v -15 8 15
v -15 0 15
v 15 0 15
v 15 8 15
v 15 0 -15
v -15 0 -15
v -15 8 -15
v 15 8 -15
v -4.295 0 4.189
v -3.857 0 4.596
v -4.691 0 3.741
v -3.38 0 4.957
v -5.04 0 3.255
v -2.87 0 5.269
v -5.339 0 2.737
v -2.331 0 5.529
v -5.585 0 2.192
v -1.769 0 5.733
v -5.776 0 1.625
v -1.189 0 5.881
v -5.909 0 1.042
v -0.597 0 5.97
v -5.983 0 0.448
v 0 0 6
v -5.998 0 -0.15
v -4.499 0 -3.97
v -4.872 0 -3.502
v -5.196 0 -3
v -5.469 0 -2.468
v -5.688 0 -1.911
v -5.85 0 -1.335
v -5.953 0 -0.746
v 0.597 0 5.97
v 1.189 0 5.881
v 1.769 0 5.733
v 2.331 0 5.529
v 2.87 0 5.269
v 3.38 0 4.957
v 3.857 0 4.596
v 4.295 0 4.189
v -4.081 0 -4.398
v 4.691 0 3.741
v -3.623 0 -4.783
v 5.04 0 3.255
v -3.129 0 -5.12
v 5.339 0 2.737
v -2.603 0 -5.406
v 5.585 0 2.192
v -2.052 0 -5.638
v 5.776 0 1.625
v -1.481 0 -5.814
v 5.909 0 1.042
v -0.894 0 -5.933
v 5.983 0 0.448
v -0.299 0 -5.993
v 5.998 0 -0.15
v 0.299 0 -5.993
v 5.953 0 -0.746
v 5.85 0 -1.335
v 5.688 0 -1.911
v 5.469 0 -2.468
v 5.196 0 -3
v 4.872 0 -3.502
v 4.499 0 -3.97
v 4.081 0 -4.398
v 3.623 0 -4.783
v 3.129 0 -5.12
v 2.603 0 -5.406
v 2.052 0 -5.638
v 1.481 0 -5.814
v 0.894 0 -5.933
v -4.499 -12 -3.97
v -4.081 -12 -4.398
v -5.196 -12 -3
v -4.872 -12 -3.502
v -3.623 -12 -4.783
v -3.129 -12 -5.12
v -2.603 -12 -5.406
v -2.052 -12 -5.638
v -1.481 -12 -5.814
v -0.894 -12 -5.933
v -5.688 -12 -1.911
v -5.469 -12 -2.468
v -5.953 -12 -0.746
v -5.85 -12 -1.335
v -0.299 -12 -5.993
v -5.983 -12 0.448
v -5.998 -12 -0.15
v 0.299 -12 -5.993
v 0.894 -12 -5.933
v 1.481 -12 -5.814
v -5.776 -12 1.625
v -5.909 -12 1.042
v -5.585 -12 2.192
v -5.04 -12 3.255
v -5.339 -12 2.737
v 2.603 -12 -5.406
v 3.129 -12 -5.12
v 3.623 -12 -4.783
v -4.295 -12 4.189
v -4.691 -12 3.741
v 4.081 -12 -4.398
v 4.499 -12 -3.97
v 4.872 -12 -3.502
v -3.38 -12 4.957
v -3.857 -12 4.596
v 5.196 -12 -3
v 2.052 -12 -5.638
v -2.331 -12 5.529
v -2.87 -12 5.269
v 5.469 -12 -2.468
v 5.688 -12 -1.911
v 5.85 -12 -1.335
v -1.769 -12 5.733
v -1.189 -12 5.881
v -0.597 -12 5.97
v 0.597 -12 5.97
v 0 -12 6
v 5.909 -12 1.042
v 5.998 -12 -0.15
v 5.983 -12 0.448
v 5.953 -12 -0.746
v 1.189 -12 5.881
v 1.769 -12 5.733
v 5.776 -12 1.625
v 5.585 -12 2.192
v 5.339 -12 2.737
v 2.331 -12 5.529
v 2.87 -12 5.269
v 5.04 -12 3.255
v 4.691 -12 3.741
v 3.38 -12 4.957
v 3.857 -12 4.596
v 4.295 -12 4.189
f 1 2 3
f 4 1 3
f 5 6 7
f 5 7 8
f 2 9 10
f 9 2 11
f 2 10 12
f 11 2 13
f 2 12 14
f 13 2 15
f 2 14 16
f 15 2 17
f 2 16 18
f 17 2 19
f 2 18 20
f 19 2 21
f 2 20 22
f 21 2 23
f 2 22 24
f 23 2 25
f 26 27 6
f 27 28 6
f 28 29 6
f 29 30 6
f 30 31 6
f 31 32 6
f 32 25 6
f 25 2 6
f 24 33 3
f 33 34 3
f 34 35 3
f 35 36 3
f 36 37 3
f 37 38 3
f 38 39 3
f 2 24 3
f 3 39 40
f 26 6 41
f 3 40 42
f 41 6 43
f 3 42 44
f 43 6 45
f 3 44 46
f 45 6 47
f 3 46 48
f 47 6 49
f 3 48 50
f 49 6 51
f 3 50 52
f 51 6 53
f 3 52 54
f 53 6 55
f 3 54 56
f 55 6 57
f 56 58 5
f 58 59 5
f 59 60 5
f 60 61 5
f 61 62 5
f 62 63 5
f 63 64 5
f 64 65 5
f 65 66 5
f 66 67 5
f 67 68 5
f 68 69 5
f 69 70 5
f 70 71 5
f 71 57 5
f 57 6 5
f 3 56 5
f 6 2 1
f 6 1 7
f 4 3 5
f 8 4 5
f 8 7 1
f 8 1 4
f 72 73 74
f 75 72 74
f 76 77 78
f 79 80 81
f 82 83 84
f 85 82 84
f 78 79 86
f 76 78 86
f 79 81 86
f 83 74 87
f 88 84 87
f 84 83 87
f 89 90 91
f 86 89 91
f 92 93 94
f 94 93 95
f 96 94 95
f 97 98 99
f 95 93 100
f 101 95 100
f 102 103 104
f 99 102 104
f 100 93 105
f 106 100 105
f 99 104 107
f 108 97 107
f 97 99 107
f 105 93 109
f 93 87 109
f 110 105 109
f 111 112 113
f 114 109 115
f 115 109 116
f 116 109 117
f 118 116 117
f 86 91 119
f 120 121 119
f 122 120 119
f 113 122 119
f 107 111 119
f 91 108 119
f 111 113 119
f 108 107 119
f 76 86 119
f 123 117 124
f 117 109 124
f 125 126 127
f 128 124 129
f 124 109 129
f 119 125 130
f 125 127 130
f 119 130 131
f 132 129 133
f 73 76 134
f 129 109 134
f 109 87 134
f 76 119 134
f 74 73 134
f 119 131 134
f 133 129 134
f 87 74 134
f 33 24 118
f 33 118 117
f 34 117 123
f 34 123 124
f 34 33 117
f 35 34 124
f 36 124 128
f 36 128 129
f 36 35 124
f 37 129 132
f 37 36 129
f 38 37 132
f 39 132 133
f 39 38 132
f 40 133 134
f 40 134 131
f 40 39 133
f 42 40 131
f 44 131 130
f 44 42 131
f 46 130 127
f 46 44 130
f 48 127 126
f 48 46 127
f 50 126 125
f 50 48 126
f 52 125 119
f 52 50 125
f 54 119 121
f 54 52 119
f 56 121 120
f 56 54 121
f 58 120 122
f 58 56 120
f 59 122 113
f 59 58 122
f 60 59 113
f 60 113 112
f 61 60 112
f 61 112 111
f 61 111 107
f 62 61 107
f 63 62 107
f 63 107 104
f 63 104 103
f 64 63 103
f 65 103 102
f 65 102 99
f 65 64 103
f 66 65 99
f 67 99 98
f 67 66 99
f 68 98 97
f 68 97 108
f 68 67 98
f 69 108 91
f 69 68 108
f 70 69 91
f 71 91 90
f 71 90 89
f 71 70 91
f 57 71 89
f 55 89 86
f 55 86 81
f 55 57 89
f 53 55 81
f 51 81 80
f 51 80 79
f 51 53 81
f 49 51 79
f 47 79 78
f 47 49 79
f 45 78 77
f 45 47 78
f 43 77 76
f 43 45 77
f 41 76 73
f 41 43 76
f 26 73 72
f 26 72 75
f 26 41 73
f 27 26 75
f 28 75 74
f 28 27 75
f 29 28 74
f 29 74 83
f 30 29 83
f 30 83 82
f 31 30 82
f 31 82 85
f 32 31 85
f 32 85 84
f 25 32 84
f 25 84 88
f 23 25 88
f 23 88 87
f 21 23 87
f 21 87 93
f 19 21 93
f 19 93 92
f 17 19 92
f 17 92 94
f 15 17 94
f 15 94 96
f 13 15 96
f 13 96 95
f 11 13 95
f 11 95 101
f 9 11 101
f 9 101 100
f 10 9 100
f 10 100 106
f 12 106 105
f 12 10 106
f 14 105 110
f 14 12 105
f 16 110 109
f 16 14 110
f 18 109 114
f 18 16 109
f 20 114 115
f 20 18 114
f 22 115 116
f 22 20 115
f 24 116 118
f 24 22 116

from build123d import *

# Parameters (mm, degrees)
SKETCH1_W           = 30
SKETCH1_H           = 30
BOSS_EXTRUDE1_DEPTH = 8
SKETCH2_R           = 6
BOSS_EXTRUDE2_DEPTH = 12


with BuildPart() as part:
    # Sketch1 → Boss-Extrude1 (new body)
    with BuildSketch(Plane(origin=(0, 0, 0), x_dir=(1, 0, 0), z_dir=(0, 1, 0))):
        Rectangle(SKETCH1_W, SKETCH1_H)
    extrude(amount=BOSS_EXTRUDE1_DEPTH)

    # Sketch2 → Boss-Extrude2 (add)
    with BuildSketch(Plane(origin=(0, 0, 0), x_dir=(1, 0, 0), z_dir=(0, 1, 0))):
        with Locations(Location((0, 0, 0), (0, 0, 270))):
            Circle(SKETCH2_R)
    extrude(amount=-BOSS_EXTRUDE2_DEPTH)


solid = part.part
